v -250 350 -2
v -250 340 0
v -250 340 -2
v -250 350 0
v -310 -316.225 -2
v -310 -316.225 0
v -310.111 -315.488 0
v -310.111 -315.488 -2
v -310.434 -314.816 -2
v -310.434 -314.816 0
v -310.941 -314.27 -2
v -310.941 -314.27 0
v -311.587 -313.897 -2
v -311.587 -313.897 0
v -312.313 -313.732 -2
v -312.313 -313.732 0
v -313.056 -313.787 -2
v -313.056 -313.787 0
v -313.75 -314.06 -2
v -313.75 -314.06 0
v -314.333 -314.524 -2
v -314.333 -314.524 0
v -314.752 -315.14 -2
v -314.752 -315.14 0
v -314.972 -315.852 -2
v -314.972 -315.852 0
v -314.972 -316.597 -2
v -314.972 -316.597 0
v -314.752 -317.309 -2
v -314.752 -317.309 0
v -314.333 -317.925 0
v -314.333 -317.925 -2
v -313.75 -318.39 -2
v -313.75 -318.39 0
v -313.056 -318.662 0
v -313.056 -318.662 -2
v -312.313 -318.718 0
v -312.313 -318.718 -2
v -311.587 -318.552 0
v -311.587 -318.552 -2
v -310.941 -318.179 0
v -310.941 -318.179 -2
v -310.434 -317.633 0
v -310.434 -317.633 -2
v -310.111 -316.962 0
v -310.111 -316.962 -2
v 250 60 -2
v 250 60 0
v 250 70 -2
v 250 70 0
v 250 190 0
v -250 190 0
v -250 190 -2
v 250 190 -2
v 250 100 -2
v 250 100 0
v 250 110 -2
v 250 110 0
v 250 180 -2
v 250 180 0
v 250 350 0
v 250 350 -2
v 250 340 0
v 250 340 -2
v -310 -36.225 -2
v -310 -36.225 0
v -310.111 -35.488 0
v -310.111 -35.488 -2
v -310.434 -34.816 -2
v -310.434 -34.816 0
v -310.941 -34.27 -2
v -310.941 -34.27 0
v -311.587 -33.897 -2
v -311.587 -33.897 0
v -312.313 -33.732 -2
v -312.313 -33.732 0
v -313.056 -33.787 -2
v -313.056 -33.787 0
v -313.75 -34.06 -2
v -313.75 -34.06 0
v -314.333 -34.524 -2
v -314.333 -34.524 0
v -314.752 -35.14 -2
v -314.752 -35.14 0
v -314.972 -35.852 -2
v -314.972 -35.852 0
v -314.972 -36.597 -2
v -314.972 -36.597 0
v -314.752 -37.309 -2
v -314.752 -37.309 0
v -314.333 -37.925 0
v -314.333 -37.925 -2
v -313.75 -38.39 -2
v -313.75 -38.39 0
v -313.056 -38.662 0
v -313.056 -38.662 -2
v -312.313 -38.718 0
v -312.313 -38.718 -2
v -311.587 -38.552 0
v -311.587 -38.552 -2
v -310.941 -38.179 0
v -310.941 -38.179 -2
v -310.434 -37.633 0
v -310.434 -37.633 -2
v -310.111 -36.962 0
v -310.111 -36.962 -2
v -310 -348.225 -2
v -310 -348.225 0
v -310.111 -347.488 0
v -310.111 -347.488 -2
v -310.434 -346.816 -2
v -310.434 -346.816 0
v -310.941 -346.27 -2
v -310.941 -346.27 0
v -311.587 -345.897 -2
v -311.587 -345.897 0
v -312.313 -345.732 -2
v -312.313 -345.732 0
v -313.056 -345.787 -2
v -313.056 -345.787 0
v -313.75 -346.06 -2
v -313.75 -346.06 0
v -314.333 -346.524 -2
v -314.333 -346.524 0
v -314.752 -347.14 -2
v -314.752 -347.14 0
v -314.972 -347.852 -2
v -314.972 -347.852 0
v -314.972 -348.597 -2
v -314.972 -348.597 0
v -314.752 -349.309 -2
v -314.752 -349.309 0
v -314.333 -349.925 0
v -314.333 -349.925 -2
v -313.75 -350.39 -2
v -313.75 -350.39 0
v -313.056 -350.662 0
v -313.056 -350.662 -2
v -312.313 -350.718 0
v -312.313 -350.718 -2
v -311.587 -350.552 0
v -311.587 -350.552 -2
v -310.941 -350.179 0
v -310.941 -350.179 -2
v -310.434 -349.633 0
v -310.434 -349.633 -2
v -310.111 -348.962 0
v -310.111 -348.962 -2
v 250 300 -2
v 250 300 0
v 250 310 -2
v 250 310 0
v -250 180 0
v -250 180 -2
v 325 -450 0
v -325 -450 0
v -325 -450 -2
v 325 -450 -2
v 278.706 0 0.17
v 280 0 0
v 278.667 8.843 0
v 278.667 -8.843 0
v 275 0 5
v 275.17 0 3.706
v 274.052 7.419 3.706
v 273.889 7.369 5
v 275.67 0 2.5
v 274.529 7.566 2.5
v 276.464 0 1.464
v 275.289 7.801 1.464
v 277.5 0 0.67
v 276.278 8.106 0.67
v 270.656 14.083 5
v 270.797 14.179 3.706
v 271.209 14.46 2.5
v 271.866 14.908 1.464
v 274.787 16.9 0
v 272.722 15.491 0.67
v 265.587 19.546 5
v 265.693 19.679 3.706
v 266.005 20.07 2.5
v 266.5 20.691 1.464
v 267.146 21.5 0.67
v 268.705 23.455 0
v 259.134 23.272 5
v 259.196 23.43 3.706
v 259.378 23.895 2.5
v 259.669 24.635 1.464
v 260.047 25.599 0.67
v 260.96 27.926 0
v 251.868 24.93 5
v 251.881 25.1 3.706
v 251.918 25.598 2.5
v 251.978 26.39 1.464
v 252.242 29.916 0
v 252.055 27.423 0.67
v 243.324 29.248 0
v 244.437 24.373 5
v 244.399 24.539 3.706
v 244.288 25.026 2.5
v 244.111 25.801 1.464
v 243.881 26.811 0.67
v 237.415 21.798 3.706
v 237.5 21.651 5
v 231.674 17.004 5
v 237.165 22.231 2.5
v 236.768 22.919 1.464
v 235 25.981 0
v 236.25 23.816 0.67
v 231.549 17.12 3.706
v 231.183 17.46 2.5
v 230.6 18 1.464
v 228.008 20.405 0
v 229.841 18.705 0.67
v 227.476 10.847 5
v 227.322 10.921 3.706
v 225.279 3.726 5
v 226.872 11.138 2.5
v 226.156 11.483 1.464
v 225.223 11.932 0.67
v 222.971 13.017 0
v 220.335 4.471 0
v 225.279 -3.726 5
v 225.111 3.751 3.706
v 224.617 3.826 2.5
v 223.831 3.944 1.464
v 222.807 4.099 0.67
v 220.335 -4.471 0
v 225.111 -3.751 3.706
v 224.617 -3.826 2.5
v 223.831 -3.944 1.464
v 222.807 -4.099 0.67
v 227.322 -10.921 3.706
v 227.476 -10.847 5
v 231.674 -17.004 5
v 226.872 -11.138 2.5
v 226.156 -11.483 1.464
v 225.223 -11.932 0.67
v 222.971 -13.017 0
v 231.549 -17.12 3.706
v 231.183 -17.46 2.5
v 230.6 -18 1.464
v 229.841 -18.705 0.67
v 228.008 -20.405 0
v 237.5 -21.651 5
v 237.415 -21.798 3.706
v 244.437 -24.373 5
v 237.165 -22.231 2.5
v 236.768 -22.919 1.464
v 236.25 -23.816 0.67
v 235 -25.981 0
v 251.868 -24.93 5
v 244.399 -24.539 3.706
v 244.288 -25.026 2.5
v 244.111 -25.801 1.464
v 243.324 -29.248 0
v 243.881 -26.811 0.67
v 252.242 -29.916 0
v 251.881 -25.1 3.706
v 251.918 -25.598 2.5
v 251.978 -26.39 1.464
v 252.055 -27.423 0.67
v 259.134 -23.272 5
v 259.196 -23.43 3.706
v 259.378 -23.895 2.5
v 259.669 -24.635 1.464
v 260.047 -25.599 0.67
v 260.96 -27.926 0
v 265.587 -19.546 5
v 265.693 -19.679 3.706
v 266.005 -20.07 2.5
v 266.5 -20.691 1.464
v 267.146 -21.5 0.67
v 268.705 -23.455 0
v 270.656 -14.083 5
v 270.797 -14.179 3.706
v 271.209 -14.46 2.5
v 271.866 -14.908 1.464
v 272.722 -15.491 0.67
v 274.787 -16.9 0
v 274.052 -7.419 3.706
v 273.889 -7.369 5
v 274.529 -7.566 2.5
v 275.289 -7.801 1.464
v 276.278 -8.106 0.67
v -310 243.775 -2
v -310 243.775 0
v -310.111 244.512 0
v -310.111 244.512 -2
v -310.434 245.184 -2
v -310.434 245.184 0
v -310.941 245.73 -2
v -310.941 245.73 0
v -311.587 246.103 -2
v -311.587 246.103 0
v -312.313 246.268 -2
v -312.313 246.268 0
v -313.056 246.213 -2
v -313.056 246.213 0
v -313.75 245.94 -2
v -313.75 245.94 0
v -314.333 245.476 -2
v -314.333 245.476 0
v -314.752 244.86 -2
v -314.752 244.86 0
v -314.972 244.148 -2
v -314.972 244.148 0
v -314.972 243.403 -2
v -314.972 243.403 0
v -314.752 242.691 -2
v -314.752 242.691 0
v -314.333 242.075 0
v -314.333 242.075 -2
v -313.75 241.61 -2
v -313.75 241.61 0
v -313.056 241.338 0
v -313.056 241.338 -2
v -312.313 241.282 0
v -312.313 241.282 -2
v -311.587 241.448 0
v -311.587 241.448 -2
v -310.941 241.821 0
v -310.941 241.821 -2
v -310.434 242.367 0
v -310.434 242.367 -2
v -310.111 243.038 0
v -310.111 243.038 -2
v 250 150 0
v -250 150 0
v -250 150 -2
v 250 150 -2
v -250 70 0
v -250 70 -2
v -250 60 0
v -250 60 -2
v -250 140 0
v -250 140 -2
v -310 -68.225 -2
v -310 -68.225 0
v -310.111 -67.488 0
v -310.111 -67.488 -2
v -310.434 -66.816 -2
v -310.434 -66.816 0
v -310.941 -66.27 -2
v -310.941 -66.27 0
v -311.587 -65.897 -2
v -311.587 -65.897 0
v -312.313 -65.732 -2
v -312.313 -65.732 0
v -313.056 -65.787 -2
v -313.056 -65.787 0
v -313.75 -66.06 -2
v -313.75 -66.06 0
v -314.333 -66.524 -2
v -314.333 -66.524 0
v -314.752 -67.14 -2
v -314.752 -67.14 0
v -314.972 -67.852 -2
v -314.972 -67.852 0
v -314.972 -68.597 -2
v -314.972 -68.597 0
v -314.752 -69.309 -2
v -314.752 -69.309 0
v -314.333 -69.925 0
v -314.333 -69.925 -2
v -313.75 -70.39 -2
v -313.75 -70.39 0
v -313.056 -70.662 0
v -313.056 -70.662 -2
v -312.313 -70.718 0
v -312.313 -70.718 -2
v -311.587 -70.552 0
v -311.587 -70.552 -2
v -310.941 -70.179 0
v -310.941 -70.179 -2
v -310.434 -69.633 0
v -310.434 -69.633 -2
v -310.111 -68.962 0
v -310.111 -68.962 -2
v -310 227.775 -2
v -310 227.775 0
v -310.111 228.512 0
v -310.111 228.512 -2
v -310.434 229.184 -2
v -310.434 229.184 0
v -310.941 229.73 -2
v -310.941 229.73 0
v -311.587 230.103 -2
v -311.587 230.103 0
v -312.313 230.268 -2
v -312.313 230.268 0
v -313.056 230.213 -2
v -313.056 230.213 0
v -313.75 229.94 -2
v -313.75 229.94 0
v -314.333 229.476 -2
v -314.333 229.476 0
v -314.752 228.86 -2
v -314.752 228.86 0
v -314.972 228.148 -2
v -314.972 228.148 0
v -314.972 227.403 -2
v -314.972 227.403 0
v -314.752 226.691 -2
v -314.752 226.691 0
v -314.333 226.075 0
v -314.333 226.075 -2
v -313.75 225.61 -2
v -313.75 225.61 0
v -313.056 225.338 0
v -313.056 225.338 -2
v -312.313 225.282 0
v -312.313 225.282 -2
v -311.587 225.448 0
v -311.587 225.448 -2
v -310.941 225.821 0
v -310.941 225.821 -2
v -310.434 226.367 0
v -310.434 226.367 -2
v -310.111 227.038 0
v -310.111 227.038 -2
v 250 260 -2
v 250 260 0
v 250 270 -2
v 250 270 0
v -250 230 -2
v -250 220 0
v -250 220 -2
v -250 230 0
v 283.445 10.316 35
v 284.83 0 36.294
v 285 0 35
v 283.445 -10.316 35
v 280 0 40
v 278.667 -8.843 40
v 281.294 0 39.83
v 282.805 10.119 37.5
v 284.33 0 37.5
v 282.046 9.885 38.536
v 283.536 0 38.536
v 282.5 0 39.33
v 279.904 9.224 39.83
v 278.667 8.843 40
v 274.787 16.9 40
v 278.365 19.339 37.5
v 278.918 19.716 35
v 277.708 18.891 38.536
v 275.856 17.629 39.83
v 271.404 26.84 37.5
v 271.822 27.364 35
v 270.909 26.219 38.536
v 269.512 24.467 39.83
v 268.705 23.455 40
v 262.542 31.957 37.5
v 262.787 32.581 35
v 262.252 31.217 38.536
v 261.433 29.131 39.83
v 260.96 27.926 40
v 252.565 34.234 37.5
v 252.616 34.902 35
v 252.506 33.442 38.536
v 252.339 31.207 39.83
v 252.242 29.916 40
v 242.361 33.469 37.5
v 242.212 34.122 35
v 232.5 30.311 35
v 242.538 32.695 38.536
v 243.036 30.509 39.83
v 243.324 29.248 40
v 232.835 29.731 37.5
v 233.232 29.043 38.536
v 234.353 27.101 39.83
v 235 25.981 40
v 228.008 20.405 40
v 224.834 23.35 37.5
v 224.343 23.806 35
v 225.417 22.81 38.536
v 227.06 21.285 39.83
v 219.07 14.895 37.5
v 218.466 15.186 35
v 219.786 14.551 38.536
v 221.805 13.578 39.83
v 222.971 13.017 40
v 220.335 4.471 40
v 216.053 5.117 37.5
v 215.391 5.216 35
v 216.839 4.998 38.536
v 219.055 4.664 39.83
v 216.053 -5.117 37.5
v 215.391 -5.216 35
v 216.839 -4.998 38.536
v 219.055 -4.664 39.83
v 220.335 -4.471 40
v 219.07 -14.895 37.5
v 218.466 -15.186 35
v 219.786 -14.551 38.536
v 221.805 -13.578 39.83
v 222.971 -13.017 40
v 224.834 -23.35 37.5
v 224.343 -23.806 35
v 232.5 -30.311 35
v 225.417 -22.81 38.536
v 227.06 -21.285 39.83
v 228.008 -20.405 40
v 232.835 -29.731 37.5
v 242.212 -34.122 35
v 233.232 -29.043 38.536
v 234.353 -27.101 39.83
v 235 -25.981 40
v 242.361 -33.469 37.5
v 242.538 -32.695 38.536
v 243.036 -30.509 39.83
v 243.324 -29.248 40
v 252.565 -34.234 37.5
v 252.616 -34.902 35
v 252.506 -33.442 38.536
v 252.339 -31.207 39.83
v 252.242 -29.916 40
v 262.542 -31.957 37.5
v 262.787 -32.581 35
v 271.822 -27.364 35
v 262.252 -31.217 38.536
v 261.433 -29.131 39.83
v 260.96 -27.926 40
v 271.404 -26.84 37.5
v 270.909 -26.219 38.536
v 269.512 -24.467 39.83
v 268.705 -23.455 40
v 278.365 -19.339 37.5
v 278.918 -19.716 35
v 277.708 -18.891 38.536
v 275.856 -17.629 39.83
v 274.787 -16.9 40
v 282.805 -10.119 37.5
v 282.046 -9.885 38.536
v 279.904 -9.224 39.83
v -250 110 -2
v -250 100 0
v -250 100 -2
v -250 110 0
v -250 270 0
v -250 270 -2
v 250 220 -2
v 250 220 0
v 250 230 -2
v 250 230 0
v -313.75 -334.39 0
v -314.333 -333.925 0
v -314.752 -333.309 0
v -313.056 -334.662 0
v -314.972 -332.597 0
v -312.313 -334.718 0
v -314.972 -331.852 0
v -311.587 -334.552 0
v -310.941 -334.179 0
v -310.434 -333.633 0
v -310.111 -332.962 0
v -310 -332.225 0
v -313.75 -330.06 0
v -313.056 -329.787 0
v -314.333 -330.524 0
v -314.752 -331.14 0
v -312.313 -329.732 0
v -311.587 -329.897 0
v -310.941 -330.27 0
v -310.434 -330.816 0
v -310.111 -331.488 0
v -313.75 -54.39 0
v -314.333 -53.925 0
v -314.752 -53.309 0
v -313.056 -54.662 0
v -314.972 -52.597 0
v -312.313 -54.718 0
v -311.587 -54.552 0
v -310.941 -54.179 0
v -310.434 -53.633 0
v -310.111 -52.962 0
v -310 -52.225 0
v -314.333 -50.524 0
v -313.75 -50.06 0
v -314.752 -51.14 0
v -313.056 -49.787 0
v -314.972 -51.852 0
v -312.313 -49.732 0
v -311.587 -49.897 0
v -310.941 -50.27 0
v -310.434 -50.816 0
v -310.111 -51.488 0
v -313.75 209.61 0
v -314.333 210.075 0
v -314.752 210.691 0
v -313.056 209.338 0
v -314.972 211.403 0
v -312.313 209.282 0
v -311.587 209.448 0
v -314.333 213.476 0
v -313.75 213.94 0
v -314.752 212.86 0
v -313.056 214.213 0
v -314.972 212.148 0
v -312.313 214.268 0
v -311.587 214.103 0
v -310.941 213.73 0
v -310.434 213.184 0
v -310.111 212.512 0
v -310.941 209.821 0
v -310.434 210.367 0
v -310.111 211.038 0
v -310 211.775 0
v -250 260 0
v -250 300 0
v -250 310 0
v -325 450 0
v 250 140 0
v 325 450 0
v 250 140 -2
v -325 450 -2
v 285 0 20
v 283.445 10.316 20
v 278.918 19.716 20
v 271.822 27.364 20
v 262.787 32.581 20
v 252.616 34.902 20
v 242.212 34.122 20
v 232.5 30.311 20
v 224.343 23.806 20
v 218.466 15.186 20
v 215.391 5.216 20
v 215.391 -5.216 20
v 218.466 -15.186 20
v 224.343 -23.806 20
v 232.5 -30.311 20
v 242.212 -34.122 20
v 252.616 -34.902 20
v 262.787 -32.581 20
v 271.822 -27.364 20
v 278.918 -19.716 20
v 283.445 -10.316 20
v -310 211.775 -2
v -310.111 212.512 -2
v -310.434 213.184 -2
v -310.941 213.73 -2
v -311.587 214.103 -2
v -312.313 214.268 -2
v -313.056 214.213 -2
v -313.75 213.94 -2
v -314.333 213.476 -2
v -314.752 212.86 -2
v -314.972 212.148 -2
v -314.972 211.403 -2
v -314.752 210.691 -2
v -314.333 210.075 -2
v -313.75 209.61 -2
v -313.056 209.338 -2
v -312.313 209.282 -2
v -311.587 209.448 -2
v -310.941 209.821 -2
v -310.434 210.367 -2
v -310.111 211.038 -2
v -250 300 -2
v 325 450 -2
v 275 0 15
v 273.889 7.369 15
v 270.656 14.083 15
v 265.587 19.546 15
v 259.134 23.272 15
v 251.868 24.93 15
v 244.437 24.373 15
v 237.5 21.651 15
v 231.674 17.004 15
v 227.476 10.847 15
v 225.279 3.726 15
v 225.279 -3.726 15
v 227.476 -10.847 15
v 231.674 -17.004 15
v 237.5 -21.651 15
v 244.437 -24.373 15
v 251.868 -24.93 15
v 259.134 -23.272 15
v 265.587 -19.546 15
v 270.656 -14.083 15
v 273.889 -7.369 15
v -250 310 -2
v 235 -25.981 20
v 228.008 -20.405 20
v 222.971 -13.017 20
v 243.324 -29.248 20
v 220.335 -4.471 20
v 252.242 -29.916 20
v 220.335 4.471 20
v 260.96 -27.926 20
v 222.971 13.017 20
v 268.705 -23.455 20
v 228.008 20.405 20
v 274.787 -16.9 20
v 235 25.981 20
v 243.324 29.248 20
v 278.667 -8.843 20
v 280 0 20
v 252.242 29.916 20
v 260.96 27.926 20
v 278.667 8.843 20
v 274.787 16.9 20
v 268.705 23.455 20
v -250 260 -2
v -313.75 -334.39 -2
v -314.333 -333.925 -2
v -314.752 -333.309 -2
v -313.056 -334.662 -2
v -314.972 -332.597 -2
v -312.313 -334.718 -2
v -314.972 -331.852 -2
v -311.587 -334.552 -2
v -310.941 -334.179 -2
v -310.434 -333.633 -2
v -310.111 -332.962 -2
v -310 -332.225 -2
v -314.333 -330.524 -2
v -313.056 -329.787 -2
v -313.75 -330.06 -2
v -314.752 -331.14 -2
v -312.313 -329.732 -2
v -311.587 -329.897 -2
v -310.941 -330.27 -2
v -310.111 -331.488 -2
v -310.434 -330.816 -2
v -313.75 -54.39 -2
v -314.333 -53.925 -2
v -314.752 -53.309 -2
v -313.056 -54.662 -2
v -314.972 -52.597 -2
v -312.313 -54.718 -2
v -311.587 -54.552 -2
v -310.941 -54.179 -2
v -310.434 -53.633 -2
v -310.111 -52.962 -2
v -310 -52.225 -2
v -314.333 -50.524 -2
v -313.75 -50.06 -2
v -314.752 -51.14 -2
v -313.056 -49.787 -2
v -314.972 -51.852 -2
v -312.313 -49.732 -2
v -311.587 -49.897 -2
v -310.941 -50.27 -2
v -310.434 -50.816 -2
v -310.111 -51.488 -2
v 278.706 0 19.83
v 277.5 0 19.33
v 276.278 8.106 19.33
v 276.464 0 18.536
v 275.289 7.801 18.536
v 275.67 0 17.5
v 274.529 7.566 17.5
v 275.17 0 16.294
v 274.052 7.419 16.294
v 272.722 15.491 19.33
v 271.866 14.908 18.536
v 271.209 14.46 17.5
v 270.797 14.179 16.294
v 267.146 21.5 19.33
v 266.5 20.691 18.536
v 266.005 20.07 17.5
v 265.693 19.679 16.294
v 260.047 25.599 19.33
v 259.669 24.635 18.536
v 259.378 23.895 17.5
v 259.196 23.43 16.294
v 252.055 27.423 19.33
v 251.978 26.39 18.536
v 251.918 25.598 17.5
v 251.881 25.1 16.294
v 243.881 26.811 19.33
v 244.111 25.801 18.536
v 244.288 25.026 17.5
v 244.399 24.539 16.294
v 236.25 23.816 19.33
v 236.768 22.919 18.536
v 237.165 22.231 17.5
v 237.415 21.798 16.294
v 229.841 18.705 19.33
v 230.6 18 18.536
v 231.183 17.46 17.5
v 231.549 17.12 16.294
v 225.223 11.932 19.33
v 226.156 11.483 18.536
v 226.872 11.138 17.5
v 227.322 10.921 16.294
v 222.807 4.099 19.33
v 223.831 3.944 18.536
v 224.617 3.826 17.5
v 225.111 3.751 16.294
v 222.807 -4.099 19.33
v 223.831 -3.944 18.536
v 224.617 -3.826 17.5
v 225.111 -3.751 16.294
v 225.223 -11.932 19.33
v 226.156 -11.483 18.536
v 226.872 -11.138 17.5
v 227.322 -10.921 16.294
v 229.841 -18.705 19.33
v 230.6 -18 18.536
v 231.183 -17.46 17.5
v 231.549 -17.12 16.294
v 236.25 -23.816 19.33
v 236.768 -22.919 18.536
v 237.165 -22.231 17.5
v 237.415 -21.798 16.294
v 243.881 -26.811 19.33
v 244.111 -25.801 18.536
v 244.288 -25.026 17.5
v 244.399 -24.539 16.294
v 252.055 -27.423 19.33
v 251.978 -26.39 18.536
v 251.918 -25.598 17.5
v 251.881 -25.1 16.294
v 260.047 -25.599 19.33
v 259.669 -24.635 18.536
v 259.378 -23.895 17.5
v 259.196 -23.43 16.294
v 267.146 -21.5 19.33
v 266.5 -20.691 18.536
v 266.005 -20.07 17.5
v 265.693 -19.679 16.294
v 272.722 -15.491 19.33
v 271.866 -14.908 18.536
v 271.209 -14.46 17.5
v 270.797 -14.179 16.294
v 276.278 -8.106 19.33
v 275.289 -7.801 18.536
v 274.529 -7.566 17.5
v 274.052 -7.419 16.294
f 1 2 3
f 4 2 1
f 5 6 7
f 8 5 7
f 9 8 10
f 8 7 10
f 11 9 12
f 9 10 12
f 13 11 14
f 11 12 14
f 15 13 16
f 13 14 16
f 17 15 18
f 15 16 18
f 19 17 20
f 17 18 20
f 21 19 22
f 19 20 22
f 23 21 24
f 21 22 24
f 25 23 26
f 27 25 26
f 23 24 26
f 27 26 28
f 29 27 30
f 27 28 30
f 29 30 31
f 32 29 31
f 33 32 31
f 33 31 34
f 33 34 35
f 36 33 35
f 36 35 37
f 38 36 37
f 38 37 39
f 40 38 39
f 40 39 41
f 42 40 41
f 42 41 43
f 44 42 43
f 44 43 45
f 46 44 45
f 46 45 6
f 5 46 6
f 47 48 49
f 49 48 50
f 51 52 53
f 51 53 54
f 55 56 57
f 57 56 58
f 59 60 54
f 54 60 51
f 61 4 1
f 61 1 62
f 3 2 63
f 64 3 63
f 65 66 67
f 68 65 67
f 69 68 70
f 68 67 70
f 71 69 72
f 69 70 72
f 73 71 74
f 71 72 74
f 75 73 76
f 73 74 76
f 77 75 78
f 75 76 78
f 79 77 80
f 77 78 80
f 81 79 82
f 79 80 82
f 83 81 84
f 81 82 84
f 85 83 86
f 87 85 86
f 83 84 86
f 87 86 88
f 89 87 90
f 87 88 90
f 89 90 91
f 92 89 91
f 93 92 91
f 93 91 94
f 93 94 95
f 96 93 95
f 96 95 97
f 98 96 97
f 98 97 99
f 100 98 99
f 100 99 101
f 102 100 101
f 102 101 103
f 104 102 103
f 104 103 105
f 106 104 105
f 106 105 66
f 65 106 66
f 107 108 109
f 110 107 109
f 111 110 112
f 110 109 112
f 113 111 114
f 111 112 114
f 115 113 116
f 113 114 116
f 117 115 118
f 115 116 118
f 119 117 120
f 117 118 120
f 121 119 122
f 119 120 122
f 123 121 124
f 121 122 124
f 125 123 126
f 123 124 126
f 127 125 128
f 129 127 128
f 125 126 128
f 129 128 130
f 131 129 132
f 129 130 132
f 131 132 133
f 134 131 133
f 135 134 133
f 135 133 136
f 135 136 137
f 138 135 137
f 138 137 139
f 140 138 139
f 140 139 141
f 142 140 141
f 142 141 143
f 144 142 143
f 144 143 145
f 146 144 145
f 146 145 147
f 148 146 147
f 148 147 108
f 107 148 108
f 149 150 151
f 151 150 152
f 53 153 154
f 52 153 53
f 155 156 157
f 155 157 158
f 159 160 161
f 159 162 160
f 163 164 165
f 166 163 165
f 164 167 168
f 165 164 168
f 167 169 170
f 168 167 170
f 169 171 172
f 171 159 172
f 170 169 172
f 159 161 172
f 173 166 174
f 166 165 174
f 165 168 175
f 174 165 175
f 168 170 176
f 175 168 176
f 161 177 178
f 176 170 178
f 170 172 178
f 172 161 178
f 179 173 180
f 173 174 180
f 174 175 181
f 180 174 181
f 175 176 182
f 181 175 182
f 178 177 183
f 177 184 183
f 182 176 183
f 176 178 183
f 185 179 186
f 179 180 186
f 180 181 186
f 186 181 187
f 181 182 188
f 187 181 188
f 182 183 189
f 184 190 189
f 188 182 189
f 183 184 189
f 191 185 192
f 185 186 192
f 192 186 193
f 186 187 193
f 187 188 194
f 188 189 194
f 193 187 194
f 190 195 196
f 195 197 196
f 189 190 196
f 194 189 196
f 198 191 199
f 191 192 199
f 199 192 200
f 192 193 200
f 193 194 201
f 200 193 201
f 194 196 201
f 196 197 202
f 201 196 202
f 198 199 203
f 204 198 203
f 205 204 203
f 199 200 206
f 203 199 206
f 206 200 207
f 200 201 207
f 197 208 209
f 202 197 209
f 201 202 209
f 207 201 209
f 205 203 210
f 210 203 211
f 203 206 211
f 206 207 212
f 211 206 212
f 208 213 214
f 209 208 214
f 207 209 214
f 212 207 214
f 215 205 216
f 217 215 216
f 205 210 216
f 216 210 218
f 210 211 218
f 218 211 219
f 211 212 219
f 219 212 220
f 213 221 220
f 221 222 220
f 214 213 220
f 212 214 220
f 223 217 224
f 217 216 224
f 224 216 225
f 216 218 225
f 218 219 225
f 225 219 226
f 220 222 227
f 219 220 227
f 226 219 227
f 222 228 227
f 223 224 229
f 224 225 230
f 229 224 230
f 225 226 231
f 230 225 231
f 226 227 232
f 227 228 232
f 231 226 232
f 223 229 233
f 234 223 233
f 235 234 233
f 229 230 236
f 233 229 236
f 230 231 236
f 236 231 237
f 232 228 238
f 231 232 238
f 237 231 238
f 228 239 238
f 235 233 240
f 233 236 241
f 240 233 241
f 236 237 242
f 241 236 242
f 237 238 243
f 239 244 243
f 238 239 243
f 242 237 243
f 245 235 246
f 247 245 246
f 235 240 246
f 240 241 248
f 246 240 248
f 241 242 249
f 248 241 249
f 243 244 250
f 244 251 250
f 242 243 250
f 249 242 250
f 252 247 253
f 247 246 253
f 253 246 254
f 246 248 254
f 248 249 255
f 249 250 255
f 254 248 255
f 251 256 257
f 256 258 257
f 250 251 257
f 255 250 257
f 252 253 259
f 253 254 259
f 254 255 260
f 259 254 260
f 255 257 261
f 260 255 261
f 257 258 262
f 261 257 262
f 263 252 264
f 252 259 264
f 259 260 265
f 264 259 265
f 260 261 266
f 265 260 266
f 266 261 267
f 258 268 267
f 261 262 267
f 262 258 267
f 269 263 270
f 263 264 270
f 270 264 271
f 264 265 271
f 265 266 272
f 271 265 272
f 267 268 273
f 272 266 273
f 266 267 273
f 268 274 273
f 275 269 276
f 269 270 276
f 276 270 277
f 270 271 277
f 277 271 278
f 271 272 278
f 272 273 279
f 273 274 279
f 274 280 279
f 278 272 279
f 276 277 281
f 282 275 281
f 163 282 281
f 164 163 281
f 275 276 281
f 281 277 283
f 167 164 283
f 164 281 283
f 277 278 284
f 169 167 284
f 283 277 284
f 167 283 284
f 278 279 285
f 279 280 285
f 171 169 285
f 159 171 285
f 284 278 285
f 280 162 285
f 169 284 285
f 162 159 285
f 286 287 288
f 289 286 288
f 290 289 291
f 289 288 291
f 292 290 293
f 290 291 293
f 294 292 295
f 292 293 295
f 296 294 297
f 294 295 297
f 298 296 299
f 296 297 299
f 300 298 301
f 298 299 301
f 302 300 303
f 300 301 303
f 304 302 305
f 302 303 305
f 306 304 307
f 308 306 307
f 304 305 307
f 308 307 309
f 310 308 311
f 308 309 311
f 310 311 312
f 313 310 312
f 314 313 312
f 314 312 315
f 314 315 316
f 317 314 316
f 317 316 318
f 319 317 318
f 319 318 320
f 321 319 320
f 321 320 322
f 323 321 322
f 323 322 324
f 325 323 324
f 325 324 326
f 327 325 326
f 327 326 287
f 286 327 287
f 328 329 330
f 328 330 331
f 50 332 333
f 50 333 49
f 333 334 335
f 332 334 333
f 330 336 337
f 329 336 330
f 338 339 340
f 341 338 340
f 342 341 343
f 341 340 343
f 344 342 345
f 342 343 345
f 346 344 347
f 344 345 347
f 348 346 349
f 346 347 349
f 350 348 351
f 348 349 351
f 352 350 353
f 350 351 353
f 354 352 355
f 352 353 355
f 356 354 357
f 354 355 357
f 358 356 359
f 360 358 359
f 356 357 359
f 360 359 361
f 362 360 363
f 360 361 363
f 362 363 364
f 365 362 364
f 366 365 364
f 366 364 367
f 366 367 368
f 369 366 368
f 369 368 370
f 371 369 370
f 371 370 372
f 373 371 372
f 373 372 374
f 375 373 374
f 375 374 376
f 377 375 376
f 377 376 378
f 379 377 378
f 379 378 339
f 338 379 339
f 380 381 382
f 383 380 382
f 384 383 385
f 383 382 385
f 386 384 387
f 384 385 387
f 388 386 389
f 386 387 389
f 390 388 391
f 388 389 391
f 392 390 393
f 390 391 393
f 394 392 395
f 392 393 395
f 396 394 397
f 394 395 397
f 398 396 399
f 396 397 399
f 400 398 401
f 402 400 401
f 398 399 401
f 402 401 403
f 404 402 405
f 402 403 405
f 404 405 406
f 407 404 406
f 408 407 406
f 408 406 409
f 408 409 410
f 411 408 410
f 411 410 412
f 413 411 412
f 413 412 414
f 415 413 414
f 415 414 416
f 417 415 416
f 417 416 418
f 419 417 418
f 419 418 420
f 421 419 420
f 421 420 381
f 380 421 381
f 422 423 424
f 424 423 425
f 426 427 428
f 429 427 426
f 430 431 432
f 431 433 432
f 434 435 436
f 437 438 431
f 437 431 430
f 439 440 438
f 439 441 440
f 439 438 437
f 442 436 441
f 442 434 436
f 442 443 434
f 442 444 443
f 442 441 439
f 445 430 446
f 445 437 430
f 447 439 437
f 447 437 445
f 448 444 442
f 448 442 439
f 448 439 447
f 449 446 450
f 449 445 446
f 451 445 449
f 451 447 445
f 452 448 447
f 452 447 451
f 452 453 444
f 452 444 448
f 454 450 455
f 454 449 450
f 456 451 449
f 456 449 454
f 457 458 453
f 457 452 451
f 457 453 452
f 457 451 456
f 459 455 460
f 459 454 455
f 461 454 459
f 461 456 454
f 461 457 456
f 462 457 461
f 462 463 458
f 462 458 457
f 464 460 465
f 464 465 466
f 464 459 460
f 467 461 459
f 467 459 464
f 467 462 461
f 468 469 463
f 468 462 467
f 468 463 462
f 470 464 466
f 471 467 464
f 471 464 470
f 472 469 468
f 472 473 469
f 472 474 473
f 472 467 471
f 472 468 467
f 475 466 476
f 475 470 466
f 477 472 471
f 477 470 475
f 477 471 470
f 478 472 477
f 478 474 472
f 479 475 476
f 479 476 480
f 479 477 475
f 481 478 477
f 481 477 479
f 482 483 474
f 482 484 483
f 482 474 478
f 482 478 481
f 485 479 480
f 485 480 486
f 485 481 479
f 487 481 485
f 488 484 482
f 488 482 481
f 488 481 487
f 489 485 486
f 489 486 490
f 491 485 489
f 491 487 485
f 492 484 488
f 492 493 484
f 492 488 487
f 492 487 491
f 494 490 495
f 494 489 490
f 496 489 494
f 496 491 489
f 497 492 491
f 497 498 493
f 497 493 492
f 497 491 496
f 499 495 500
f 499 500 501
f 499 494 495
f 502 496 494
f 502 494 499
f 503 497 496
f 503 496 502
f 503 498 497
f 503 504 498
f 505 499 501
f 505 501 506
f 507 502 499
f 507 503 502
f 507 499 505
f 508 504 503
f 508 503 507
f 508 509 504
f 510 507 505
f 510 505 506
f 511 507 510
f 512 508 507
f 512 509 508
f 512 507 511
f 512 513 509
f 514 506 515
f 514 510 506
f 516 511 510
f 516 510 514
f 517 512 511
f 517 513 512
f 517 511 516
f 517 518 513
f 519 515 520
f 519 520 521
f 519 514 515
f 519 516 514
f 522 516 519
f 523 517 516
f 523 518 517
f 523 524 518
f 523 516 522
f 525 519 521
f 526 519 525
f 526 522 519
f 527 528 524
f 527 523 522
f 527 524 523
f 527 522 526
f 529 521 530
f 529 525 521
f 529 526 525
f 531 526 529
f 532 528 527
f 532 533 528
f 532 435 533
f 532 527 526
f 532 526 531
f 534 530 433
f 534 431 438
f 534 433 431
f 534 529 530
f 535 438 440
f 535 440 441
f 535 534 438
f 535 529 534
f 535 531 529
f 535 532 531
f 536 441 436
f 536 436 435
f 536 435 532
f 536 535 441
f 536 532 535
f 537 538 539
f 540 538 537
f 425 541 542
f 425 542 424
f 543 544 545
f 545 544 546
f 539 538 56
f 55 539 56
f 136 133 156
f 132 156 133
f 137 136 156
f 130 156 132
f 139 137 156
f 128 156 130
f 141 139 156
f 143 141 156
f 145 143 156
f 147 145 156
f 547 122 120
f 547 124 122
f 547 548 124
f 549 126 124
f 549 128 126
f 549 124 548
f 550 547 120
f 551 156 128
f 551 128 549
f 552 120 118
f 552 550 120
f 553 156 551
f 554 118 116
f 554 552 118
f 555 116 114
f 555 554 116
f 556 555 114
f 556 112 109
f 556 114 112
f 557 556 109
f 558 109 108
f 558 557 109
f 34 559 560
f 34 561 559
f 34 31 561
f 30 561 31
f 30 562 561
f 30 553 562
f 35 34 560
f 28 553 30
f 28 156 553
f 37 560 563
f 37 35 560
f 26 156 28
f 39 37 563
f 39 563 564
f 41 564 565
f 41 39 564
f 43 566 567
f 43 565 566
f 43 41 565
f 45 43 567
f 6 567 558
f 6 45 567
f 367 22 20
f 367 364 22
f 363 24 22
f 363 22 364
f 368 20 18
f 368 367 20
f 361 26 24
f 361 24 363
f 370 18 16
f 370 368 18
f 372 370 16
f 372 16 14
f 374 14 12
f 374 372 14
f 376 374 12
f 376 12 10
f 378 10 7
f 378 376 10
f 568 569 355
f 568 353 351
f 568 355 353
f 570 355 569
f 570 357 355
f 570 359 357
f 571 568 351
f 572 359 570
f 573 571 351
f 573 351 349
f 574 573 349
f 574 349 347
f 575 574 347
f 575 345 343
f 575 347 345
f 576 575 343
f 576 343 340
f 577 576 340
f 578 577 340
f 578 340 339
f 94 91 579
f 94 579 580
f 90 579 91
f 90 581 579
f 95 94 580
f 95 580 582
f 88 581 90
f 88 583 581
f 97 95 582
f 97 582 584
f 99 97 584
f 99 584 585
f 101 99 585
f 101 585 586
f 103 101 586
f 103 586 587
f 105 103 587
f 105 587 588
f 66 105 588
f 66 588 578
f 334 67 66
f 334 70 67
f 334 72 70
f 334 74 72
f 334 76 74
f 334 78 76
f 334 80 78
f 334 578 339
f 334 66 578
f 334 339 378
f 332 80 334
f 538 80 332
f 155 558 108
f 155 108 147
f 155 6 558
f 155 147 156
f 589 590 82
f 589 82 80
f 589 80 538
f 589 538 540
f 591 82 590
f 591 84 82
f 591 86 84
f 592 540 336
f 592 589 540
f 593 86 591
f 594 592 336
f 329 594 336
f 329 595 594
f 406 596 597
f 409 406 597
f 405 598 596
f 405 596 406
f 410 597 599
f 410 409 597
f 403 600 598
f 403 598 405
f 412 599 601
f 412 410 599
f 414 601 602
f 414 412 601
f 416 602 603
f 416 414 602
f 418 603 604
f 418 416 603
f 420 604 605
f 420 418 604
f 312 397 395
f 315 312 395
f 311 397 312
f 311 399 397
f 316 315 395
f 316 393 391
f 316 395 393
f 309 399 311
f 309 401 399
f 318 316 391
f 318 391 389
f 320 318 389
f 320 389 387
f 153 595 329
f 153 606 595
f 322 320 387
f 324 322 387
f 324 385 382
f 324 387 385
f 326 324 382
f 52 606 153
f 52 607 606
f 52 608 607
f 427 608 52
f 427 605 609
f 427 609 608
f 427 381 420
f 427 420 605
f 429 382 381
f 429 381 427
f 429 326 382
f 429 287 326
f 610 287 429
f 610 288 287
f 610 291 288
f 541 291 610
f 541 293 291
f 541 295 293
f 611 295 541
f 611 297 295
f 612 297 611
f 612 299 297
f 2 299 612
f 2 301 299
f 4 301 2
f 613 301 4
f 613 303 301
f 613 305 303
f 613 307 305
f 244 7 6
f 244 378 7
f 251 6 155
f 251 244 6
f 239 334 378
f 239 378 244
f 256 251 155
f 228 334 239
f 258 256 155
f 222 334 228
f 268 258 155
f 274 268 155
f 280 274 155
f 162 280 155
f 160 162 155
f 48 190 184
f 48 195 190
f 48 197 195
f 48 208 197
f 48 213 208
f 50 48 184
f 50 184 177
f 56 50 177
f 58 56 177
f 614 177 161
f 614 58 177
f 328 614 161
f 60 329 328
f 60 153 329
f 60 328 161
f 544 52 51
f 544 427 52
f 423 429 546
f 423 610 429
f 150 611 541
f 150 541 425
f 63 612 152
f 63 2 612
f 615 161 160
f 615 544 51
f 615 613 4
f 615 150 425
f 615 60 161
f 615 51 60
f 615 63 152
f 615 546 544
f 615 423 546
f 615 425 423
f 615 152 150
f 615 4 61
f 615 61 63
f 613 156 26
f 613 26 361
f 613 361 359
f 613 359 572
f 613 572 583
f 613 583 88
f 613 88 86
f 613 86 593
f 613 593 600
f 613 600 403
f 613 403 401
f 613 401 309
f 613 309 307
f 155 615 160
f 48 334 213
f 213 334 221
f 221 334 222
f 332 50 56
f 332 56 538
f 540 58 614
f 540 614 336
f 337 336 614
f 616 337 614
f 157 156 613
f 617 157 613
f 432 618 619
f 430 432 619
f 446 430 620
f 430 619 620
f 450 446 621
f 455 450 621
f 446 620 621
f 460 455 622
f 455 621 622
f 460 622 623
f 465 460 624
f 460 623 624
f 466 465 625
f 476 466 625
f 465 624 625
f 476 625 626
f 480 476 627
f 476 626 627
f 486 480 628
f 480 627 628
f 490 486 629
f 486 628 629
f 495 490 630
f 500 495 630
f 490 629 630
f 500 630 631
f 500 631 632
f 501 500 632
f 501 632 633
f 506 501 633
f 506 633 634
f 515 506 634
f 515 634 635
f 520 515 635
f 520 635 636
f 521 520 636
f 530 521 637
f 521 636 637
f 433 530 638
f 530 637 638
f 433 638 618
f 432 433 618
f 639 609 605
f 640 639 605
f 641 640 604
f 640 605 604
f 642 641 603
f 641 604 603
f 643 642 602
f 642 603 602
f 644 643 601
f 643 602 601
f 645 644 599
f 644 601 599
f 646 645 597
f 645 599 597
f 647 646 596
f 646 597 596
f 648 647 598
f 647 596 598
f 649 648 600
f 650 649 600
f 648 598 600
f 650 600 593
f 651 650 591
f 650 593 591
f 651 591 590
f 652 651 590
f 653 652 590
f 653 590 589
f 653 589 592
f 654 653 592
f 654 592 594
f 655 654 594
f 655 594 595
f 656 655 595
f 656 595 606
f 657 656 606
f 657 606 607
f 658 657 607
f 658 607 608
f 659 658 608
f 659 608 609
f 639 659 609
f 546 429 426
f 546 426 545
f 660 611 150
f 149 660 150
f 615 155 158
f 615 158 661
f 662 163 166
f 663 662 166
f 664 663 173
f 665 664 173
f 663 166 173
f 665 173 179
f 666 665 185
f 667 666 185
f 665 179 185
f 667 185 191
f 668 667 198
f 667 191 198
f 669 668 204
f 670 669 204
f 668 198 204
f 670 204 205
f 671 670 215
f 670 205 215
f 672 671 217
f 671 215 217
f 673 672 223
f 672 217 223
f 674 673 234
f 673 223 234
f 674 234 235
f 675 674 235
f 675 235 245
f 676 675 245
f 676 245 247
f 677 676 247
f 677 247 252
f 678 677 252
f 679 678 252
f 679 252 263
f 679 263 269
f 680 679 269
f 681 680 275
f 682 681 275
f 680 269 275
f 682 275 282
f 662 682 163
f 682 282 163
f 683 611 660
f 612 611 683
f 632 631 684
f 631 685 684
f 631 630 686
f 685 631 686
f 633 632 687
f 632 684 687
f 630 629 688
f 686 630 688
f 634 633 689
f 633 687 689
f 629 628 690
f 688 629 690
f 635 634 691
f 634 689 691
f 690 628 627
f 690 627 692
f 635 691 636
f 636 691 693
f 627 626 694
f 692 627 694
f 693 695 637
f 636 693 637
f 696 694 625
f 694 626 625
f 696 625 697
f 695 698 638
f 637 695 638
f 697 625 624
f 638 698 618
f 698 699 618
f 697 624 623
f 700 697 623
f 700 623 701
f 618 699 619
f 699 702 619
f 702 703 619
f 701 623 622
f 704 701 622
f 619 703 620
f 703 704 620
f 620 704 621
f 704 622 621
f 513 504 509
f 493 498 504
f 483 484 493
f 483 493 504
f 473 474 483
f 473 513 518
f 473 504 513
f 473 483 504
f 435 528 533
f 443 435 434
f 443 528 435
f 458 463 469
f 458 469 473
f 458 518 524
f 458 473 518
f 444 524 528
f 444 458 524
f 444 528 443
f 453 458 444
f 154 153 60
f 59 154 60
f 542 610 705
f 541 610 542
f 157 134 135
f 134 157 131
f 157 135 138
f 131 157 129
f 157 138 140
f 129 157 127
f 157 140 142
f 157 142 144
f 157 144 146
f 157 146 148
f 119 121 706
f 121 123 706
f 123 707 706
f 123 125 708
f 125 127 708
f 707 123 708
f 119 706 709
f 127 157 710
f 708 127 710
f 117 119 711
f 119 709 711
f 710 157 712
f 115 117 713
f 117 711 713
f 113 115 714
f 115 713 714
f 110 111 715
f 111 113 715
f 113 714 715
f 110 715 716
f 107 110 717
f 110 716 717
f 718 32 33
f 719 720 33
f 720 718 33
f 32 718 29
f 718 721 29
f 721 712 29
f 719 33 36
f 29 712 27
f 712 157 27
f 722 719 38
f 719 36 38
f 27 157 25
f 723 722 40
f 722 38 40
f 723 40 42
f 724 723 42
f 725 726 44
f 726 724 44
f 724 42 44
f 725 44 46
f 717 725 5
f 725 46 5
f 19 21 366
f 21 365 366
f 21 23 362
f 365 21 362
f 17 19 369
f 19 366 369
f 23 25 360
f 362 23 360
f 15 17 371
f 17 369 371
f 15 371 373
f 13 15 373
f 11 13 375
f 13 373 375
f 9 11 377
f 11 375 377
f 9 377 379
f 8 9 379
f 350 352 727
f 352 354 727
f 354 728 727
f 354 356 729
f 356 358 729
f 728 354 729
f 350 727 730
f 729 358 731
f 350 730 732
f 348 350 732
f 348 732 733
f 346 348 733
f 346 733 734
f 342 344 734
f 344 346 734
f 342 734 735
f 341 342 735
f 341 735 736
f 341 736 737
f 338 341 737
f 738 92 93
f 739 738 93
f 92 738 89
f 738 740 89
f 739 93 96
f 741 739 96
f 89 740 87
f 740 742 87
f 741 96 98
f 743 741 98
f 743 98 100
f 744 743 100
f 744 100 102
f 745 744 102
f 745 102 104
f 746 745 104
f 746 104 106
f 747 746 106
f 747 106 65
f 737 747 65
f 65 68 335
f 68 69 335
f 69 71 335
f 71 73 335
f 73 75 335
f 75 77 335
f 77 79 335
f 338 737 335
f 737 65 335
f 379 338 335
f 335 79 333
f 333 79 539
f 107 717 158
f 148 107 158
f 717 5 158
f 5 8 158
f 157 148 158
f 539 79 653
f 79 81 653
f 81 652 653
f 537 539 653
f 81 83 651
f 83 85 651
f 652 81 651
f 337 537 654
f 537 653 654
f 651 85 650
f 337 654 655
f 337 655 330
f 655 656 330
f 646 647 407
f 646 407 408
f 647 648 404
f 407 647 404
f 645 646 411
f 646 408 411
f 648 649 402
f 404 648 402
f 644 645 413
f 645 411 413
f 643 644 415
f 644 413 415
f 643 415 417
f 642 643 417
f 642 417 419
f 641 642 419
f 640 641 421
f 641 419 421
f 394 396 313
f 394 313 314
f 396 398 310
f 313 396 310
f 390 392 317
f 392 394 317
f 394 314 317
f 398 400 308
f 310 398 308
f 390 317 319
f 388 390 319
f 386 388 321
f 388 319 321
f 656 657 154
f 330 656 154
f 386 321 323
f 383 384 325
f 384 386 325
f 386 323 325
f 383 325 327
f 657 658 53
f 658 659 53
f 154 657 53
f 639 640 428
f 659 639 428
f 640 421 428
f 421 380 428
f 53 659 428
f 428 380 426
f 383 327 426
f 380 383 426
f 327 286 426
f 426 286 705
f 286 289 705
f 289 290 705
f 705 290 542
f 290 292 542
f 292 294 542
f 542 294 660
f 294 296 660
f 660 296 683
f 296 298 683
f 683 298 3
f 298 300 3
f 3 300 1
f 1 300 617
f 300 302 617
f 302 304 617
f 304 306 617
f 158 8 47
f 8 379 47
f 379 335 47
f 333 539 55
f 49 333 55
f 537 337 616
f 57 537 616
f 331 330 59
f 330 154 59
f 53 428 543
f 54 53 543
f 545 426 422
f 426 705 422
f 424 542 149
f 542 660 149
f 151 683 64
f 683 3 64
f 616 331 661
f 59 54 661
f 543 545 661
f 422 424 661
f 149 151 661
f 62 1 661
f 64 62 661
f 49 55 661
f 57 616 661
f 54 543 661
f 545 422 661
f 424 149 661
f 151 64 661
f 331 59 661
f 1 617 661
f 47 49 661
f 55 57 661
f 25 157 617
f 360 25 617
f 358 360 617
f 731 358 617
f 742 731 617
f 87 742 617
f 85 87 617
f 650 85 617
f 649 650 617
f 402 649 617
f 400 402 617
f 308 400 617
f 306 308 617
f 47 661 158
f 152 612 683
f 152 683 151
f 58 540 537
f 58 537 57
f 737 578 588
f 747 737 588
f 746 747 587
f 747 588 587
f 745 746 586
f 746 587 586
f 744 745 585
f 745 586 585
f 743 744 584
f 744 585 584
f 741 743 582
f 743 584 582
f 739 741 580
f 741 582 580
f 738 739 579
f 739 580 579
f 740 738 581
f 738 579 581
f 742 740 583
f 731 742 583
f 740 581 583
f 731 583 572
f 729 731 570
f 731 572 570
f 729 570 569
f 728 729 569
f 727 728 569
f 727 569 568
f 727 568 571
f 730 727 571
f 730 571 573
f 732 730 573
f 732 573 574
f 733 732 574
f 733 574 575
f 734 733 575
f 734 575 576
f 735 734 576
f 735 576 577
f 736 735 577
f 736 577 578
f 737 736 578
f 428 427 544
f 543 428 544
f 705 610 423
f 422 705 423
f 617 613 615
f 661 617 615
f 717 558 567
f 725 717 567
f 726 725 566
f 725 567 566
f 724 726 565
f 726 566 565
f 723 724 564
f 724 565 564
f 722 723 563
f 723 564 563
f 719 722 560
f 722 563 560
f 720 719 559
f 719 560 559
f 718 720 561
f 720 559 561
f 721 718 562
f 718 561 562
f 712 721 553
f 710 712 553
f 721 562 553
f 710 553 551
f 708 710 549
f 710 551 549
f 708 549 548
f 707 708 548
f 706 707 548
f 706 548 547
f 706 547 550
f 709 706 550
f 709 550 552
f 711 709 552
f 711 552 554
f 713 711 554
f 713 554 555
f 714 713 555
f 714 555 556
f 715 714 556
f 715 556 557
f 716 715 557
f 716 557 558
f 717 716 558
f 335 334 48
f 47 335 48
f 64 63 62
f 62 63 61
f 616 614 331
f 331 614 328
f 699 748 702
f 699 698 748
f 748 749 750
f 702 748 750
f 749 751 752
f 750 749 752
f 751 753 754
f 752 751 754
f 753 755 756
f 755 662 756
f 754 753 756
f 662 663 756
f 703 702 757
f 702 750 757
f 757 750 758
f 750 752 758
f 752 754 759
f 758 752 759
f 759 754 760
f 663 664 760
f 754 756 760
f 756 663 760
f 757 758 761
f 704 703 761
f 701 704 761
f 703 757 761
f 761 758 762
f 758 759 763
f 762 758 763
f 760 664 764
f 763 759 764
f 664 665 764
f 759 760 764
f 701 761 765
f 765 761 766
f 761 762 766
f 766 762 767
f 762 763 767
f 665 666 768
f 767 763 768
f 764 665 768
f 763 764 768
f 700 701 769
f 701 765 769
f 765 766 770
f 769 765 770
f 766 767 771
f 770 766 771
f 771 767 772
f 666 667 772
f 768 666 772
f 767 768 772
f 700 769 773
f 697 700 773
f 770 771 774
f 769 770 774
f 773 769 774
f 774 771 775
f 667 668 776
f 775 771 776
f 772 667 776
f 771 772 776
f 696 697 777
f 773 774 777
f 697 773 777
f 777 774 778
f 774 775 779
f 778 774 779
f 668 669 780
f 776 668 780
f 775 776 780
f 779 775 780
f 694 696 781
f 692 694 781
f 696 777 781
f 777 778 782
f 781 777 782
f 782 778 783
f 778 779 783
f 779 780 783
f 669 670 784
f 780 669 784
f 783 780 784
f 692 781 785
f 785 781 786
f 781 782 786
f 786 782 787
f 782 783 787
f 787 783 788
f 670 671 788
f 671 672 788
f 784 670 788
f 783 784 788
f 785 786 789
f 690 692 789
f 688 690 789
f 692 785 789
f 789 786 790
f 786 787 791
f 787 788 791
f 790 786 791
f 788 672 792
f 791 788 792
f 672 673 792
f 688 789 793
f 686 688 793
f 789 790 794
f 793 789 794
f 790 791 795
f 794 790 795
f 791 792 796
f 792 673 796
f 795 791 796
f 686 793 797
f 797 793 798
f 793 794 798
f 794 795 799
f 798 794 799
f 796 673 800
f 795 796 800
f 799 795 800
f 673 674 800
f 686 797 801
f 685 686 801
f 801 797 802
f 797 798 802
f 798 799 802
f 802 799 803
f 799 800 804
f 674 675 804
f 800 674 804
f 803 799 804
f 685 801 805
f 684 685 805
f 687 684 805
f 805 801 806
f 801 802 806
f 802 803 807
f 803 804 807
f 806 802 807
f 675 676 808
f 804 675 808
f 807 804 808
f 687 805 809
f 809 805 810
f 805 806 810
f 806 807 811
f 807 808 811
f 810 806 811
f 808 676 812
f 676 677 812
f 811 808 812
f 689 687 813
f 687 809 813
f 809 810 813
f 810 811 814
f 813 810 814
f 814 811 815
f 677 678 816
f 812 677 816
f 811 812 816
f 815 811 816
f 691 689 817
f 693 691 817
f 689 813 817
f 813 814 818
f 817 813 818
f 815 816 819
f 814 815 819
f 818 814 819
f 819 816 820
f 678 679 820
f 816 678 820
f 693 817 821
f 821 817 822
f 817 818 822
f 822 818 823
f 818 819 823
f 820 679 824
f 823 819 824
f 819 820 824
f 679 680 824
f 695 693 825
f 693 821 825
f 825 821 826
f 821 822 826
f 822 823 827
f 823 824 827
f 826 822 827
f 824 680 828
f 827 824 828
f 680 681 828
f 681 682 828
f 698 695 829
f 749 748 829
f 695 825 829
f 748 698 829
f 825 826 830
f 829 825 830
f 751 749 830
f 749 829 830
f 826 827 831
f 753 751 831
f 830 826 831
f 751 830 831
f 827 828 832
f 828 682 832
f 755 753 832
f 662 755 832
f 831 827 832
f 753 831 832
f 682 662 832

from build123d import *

# Parameters (mm, degrees)
ESQUISSE1_W               = 650
ESQUISSE1_H               = 900
T_LE_DE_BASE_PLI_E1_DEPTH = 2
ESQUISSE6_W               = 500
ESQUISSE6_H               = 10
ENL_V_MAT_EXTRU_1_DEPTH   = 10
ESQUISSE7_R               = 25
BOSS_EXTRU_1_DEPTH        = 20
ESQUISSE8_R               = 35
BOSS_EXTRU_2_DEPTH        = 20
CONG_1_R                  = 5
ESQUISSE9_R               = 2.5
ENL_V_MAT_EXTRU_2_DEPTH   = 20


# Sheet-metal steps are written as plain solids
with BuildPart() as part:
    # Esquisse1 → Tôle de base pliée1 (new body)
    with BuildSketch(Plane.XY):
        Rectangle(ESQUISSE1_W, ESQUISSE1_H)
    extrude(amount=-T_LE_DE_BASE_PLI_E1_DEPTH)

    # Esquisse6 → Enlèv. mat.-Extru.1 (cut)
    with BuildSketch(Plane.XY):
        with Locations((0, 345)):
            Rectangle(ESQUISSE6_W, ESQUISSE6_H)
        with Locations((0, 305)):
            Rectangle(ESQUISSE6_W, ESQUISSE6_H)
        with Locations((0, 265)):
            Rectangle(ESQUISSE6_W, ESQUISSE6_H)
        with Locations((0, 225)):
            Rectangle(ESQUISSE6_W, ESQUISSE6_H)
        with Locations((0, 185)):
            Rectangle(ESQUISSE6_W, ESQUISSE6_H)
        with Locations((0, 145)):
            Rectangle(ESQUISSE6_W, ESQUISSE6_H)
        with Locations((0, 105)):
            Rectangle(ESQUISSE6_W, ESQUISSE6_H)
        with Locations((0, 65)):
            Rectangle(ESQUISSE6_W, ESQUISSE6_H)
    extrude(amount=-ENL_V_MAT_EXTRU_1_DEPTH, mode=Mode.SUBTRACT)

    # Esquisse7 → Boss.-Extru.1 (add)
    with BuildSketch(Plane.XY):
        with Locations((250, 0)):
            Circle(ESQUISSE7_R)
    extrude(amount=BOSS_EXTRU_1_DEPTH)

    # Esquisse8 → Boss.-Extru.2 (add)
    with BuildSketch(Plane.XY.offset(20)):
        with Locations((250, 0)):
            Circle(ESQUISSE8_R)
    extrude(amount=BOSS_EXTRU_2_DEPTH)

    # Congé1
    cong_1_edges = [part.edges().sort_by_distance(p)[0] for p in [
        (225, 0, 0),
        (225, 0, 20),
        (215, 0, 40),
    ]]
    fillet(cong_1_edges, radius=CONG_1_R)

    # Esquisse9 → Enlèv. mat.-Extru.2 (cut)
    with BuildSketch(Plane.XY):
        with Locations((-312.5, 243.775317496)):
            Circle(ESQUISSE9_R)
        with Locations((-312.5, 227.775317496)):
            Circle(ESQUISSE9_R)
        with Locations((-312.5, 211.775317496)):
            Circle(ESQUISSE9_R)
        with Locations((-312.5, -36.224682504)):
            Circle(ESQUISSE9_R)
        with Locations((-312.5, -52.224682504)):
            Circle(ESQUISSE9_R)
        with Locations((-312.5, -68.224682504)):
            Circle(ESQUISSE9_R)
        with Locations((-312.5, -316.224682504)):
            Circle(ESQUISSE9_R)
        with Locations((-312.5, -332.224682504)):
            Circle(ESQUISSE9_R)
        with Locations((-312.5, -348.224682504)):
            Circle(ESQUISSE9_R)
    extrude(amount=-ENL_V_MAT_EXTRU_2_DEPTH, mode=Mode.SUBTRACT)


solid = part.part
